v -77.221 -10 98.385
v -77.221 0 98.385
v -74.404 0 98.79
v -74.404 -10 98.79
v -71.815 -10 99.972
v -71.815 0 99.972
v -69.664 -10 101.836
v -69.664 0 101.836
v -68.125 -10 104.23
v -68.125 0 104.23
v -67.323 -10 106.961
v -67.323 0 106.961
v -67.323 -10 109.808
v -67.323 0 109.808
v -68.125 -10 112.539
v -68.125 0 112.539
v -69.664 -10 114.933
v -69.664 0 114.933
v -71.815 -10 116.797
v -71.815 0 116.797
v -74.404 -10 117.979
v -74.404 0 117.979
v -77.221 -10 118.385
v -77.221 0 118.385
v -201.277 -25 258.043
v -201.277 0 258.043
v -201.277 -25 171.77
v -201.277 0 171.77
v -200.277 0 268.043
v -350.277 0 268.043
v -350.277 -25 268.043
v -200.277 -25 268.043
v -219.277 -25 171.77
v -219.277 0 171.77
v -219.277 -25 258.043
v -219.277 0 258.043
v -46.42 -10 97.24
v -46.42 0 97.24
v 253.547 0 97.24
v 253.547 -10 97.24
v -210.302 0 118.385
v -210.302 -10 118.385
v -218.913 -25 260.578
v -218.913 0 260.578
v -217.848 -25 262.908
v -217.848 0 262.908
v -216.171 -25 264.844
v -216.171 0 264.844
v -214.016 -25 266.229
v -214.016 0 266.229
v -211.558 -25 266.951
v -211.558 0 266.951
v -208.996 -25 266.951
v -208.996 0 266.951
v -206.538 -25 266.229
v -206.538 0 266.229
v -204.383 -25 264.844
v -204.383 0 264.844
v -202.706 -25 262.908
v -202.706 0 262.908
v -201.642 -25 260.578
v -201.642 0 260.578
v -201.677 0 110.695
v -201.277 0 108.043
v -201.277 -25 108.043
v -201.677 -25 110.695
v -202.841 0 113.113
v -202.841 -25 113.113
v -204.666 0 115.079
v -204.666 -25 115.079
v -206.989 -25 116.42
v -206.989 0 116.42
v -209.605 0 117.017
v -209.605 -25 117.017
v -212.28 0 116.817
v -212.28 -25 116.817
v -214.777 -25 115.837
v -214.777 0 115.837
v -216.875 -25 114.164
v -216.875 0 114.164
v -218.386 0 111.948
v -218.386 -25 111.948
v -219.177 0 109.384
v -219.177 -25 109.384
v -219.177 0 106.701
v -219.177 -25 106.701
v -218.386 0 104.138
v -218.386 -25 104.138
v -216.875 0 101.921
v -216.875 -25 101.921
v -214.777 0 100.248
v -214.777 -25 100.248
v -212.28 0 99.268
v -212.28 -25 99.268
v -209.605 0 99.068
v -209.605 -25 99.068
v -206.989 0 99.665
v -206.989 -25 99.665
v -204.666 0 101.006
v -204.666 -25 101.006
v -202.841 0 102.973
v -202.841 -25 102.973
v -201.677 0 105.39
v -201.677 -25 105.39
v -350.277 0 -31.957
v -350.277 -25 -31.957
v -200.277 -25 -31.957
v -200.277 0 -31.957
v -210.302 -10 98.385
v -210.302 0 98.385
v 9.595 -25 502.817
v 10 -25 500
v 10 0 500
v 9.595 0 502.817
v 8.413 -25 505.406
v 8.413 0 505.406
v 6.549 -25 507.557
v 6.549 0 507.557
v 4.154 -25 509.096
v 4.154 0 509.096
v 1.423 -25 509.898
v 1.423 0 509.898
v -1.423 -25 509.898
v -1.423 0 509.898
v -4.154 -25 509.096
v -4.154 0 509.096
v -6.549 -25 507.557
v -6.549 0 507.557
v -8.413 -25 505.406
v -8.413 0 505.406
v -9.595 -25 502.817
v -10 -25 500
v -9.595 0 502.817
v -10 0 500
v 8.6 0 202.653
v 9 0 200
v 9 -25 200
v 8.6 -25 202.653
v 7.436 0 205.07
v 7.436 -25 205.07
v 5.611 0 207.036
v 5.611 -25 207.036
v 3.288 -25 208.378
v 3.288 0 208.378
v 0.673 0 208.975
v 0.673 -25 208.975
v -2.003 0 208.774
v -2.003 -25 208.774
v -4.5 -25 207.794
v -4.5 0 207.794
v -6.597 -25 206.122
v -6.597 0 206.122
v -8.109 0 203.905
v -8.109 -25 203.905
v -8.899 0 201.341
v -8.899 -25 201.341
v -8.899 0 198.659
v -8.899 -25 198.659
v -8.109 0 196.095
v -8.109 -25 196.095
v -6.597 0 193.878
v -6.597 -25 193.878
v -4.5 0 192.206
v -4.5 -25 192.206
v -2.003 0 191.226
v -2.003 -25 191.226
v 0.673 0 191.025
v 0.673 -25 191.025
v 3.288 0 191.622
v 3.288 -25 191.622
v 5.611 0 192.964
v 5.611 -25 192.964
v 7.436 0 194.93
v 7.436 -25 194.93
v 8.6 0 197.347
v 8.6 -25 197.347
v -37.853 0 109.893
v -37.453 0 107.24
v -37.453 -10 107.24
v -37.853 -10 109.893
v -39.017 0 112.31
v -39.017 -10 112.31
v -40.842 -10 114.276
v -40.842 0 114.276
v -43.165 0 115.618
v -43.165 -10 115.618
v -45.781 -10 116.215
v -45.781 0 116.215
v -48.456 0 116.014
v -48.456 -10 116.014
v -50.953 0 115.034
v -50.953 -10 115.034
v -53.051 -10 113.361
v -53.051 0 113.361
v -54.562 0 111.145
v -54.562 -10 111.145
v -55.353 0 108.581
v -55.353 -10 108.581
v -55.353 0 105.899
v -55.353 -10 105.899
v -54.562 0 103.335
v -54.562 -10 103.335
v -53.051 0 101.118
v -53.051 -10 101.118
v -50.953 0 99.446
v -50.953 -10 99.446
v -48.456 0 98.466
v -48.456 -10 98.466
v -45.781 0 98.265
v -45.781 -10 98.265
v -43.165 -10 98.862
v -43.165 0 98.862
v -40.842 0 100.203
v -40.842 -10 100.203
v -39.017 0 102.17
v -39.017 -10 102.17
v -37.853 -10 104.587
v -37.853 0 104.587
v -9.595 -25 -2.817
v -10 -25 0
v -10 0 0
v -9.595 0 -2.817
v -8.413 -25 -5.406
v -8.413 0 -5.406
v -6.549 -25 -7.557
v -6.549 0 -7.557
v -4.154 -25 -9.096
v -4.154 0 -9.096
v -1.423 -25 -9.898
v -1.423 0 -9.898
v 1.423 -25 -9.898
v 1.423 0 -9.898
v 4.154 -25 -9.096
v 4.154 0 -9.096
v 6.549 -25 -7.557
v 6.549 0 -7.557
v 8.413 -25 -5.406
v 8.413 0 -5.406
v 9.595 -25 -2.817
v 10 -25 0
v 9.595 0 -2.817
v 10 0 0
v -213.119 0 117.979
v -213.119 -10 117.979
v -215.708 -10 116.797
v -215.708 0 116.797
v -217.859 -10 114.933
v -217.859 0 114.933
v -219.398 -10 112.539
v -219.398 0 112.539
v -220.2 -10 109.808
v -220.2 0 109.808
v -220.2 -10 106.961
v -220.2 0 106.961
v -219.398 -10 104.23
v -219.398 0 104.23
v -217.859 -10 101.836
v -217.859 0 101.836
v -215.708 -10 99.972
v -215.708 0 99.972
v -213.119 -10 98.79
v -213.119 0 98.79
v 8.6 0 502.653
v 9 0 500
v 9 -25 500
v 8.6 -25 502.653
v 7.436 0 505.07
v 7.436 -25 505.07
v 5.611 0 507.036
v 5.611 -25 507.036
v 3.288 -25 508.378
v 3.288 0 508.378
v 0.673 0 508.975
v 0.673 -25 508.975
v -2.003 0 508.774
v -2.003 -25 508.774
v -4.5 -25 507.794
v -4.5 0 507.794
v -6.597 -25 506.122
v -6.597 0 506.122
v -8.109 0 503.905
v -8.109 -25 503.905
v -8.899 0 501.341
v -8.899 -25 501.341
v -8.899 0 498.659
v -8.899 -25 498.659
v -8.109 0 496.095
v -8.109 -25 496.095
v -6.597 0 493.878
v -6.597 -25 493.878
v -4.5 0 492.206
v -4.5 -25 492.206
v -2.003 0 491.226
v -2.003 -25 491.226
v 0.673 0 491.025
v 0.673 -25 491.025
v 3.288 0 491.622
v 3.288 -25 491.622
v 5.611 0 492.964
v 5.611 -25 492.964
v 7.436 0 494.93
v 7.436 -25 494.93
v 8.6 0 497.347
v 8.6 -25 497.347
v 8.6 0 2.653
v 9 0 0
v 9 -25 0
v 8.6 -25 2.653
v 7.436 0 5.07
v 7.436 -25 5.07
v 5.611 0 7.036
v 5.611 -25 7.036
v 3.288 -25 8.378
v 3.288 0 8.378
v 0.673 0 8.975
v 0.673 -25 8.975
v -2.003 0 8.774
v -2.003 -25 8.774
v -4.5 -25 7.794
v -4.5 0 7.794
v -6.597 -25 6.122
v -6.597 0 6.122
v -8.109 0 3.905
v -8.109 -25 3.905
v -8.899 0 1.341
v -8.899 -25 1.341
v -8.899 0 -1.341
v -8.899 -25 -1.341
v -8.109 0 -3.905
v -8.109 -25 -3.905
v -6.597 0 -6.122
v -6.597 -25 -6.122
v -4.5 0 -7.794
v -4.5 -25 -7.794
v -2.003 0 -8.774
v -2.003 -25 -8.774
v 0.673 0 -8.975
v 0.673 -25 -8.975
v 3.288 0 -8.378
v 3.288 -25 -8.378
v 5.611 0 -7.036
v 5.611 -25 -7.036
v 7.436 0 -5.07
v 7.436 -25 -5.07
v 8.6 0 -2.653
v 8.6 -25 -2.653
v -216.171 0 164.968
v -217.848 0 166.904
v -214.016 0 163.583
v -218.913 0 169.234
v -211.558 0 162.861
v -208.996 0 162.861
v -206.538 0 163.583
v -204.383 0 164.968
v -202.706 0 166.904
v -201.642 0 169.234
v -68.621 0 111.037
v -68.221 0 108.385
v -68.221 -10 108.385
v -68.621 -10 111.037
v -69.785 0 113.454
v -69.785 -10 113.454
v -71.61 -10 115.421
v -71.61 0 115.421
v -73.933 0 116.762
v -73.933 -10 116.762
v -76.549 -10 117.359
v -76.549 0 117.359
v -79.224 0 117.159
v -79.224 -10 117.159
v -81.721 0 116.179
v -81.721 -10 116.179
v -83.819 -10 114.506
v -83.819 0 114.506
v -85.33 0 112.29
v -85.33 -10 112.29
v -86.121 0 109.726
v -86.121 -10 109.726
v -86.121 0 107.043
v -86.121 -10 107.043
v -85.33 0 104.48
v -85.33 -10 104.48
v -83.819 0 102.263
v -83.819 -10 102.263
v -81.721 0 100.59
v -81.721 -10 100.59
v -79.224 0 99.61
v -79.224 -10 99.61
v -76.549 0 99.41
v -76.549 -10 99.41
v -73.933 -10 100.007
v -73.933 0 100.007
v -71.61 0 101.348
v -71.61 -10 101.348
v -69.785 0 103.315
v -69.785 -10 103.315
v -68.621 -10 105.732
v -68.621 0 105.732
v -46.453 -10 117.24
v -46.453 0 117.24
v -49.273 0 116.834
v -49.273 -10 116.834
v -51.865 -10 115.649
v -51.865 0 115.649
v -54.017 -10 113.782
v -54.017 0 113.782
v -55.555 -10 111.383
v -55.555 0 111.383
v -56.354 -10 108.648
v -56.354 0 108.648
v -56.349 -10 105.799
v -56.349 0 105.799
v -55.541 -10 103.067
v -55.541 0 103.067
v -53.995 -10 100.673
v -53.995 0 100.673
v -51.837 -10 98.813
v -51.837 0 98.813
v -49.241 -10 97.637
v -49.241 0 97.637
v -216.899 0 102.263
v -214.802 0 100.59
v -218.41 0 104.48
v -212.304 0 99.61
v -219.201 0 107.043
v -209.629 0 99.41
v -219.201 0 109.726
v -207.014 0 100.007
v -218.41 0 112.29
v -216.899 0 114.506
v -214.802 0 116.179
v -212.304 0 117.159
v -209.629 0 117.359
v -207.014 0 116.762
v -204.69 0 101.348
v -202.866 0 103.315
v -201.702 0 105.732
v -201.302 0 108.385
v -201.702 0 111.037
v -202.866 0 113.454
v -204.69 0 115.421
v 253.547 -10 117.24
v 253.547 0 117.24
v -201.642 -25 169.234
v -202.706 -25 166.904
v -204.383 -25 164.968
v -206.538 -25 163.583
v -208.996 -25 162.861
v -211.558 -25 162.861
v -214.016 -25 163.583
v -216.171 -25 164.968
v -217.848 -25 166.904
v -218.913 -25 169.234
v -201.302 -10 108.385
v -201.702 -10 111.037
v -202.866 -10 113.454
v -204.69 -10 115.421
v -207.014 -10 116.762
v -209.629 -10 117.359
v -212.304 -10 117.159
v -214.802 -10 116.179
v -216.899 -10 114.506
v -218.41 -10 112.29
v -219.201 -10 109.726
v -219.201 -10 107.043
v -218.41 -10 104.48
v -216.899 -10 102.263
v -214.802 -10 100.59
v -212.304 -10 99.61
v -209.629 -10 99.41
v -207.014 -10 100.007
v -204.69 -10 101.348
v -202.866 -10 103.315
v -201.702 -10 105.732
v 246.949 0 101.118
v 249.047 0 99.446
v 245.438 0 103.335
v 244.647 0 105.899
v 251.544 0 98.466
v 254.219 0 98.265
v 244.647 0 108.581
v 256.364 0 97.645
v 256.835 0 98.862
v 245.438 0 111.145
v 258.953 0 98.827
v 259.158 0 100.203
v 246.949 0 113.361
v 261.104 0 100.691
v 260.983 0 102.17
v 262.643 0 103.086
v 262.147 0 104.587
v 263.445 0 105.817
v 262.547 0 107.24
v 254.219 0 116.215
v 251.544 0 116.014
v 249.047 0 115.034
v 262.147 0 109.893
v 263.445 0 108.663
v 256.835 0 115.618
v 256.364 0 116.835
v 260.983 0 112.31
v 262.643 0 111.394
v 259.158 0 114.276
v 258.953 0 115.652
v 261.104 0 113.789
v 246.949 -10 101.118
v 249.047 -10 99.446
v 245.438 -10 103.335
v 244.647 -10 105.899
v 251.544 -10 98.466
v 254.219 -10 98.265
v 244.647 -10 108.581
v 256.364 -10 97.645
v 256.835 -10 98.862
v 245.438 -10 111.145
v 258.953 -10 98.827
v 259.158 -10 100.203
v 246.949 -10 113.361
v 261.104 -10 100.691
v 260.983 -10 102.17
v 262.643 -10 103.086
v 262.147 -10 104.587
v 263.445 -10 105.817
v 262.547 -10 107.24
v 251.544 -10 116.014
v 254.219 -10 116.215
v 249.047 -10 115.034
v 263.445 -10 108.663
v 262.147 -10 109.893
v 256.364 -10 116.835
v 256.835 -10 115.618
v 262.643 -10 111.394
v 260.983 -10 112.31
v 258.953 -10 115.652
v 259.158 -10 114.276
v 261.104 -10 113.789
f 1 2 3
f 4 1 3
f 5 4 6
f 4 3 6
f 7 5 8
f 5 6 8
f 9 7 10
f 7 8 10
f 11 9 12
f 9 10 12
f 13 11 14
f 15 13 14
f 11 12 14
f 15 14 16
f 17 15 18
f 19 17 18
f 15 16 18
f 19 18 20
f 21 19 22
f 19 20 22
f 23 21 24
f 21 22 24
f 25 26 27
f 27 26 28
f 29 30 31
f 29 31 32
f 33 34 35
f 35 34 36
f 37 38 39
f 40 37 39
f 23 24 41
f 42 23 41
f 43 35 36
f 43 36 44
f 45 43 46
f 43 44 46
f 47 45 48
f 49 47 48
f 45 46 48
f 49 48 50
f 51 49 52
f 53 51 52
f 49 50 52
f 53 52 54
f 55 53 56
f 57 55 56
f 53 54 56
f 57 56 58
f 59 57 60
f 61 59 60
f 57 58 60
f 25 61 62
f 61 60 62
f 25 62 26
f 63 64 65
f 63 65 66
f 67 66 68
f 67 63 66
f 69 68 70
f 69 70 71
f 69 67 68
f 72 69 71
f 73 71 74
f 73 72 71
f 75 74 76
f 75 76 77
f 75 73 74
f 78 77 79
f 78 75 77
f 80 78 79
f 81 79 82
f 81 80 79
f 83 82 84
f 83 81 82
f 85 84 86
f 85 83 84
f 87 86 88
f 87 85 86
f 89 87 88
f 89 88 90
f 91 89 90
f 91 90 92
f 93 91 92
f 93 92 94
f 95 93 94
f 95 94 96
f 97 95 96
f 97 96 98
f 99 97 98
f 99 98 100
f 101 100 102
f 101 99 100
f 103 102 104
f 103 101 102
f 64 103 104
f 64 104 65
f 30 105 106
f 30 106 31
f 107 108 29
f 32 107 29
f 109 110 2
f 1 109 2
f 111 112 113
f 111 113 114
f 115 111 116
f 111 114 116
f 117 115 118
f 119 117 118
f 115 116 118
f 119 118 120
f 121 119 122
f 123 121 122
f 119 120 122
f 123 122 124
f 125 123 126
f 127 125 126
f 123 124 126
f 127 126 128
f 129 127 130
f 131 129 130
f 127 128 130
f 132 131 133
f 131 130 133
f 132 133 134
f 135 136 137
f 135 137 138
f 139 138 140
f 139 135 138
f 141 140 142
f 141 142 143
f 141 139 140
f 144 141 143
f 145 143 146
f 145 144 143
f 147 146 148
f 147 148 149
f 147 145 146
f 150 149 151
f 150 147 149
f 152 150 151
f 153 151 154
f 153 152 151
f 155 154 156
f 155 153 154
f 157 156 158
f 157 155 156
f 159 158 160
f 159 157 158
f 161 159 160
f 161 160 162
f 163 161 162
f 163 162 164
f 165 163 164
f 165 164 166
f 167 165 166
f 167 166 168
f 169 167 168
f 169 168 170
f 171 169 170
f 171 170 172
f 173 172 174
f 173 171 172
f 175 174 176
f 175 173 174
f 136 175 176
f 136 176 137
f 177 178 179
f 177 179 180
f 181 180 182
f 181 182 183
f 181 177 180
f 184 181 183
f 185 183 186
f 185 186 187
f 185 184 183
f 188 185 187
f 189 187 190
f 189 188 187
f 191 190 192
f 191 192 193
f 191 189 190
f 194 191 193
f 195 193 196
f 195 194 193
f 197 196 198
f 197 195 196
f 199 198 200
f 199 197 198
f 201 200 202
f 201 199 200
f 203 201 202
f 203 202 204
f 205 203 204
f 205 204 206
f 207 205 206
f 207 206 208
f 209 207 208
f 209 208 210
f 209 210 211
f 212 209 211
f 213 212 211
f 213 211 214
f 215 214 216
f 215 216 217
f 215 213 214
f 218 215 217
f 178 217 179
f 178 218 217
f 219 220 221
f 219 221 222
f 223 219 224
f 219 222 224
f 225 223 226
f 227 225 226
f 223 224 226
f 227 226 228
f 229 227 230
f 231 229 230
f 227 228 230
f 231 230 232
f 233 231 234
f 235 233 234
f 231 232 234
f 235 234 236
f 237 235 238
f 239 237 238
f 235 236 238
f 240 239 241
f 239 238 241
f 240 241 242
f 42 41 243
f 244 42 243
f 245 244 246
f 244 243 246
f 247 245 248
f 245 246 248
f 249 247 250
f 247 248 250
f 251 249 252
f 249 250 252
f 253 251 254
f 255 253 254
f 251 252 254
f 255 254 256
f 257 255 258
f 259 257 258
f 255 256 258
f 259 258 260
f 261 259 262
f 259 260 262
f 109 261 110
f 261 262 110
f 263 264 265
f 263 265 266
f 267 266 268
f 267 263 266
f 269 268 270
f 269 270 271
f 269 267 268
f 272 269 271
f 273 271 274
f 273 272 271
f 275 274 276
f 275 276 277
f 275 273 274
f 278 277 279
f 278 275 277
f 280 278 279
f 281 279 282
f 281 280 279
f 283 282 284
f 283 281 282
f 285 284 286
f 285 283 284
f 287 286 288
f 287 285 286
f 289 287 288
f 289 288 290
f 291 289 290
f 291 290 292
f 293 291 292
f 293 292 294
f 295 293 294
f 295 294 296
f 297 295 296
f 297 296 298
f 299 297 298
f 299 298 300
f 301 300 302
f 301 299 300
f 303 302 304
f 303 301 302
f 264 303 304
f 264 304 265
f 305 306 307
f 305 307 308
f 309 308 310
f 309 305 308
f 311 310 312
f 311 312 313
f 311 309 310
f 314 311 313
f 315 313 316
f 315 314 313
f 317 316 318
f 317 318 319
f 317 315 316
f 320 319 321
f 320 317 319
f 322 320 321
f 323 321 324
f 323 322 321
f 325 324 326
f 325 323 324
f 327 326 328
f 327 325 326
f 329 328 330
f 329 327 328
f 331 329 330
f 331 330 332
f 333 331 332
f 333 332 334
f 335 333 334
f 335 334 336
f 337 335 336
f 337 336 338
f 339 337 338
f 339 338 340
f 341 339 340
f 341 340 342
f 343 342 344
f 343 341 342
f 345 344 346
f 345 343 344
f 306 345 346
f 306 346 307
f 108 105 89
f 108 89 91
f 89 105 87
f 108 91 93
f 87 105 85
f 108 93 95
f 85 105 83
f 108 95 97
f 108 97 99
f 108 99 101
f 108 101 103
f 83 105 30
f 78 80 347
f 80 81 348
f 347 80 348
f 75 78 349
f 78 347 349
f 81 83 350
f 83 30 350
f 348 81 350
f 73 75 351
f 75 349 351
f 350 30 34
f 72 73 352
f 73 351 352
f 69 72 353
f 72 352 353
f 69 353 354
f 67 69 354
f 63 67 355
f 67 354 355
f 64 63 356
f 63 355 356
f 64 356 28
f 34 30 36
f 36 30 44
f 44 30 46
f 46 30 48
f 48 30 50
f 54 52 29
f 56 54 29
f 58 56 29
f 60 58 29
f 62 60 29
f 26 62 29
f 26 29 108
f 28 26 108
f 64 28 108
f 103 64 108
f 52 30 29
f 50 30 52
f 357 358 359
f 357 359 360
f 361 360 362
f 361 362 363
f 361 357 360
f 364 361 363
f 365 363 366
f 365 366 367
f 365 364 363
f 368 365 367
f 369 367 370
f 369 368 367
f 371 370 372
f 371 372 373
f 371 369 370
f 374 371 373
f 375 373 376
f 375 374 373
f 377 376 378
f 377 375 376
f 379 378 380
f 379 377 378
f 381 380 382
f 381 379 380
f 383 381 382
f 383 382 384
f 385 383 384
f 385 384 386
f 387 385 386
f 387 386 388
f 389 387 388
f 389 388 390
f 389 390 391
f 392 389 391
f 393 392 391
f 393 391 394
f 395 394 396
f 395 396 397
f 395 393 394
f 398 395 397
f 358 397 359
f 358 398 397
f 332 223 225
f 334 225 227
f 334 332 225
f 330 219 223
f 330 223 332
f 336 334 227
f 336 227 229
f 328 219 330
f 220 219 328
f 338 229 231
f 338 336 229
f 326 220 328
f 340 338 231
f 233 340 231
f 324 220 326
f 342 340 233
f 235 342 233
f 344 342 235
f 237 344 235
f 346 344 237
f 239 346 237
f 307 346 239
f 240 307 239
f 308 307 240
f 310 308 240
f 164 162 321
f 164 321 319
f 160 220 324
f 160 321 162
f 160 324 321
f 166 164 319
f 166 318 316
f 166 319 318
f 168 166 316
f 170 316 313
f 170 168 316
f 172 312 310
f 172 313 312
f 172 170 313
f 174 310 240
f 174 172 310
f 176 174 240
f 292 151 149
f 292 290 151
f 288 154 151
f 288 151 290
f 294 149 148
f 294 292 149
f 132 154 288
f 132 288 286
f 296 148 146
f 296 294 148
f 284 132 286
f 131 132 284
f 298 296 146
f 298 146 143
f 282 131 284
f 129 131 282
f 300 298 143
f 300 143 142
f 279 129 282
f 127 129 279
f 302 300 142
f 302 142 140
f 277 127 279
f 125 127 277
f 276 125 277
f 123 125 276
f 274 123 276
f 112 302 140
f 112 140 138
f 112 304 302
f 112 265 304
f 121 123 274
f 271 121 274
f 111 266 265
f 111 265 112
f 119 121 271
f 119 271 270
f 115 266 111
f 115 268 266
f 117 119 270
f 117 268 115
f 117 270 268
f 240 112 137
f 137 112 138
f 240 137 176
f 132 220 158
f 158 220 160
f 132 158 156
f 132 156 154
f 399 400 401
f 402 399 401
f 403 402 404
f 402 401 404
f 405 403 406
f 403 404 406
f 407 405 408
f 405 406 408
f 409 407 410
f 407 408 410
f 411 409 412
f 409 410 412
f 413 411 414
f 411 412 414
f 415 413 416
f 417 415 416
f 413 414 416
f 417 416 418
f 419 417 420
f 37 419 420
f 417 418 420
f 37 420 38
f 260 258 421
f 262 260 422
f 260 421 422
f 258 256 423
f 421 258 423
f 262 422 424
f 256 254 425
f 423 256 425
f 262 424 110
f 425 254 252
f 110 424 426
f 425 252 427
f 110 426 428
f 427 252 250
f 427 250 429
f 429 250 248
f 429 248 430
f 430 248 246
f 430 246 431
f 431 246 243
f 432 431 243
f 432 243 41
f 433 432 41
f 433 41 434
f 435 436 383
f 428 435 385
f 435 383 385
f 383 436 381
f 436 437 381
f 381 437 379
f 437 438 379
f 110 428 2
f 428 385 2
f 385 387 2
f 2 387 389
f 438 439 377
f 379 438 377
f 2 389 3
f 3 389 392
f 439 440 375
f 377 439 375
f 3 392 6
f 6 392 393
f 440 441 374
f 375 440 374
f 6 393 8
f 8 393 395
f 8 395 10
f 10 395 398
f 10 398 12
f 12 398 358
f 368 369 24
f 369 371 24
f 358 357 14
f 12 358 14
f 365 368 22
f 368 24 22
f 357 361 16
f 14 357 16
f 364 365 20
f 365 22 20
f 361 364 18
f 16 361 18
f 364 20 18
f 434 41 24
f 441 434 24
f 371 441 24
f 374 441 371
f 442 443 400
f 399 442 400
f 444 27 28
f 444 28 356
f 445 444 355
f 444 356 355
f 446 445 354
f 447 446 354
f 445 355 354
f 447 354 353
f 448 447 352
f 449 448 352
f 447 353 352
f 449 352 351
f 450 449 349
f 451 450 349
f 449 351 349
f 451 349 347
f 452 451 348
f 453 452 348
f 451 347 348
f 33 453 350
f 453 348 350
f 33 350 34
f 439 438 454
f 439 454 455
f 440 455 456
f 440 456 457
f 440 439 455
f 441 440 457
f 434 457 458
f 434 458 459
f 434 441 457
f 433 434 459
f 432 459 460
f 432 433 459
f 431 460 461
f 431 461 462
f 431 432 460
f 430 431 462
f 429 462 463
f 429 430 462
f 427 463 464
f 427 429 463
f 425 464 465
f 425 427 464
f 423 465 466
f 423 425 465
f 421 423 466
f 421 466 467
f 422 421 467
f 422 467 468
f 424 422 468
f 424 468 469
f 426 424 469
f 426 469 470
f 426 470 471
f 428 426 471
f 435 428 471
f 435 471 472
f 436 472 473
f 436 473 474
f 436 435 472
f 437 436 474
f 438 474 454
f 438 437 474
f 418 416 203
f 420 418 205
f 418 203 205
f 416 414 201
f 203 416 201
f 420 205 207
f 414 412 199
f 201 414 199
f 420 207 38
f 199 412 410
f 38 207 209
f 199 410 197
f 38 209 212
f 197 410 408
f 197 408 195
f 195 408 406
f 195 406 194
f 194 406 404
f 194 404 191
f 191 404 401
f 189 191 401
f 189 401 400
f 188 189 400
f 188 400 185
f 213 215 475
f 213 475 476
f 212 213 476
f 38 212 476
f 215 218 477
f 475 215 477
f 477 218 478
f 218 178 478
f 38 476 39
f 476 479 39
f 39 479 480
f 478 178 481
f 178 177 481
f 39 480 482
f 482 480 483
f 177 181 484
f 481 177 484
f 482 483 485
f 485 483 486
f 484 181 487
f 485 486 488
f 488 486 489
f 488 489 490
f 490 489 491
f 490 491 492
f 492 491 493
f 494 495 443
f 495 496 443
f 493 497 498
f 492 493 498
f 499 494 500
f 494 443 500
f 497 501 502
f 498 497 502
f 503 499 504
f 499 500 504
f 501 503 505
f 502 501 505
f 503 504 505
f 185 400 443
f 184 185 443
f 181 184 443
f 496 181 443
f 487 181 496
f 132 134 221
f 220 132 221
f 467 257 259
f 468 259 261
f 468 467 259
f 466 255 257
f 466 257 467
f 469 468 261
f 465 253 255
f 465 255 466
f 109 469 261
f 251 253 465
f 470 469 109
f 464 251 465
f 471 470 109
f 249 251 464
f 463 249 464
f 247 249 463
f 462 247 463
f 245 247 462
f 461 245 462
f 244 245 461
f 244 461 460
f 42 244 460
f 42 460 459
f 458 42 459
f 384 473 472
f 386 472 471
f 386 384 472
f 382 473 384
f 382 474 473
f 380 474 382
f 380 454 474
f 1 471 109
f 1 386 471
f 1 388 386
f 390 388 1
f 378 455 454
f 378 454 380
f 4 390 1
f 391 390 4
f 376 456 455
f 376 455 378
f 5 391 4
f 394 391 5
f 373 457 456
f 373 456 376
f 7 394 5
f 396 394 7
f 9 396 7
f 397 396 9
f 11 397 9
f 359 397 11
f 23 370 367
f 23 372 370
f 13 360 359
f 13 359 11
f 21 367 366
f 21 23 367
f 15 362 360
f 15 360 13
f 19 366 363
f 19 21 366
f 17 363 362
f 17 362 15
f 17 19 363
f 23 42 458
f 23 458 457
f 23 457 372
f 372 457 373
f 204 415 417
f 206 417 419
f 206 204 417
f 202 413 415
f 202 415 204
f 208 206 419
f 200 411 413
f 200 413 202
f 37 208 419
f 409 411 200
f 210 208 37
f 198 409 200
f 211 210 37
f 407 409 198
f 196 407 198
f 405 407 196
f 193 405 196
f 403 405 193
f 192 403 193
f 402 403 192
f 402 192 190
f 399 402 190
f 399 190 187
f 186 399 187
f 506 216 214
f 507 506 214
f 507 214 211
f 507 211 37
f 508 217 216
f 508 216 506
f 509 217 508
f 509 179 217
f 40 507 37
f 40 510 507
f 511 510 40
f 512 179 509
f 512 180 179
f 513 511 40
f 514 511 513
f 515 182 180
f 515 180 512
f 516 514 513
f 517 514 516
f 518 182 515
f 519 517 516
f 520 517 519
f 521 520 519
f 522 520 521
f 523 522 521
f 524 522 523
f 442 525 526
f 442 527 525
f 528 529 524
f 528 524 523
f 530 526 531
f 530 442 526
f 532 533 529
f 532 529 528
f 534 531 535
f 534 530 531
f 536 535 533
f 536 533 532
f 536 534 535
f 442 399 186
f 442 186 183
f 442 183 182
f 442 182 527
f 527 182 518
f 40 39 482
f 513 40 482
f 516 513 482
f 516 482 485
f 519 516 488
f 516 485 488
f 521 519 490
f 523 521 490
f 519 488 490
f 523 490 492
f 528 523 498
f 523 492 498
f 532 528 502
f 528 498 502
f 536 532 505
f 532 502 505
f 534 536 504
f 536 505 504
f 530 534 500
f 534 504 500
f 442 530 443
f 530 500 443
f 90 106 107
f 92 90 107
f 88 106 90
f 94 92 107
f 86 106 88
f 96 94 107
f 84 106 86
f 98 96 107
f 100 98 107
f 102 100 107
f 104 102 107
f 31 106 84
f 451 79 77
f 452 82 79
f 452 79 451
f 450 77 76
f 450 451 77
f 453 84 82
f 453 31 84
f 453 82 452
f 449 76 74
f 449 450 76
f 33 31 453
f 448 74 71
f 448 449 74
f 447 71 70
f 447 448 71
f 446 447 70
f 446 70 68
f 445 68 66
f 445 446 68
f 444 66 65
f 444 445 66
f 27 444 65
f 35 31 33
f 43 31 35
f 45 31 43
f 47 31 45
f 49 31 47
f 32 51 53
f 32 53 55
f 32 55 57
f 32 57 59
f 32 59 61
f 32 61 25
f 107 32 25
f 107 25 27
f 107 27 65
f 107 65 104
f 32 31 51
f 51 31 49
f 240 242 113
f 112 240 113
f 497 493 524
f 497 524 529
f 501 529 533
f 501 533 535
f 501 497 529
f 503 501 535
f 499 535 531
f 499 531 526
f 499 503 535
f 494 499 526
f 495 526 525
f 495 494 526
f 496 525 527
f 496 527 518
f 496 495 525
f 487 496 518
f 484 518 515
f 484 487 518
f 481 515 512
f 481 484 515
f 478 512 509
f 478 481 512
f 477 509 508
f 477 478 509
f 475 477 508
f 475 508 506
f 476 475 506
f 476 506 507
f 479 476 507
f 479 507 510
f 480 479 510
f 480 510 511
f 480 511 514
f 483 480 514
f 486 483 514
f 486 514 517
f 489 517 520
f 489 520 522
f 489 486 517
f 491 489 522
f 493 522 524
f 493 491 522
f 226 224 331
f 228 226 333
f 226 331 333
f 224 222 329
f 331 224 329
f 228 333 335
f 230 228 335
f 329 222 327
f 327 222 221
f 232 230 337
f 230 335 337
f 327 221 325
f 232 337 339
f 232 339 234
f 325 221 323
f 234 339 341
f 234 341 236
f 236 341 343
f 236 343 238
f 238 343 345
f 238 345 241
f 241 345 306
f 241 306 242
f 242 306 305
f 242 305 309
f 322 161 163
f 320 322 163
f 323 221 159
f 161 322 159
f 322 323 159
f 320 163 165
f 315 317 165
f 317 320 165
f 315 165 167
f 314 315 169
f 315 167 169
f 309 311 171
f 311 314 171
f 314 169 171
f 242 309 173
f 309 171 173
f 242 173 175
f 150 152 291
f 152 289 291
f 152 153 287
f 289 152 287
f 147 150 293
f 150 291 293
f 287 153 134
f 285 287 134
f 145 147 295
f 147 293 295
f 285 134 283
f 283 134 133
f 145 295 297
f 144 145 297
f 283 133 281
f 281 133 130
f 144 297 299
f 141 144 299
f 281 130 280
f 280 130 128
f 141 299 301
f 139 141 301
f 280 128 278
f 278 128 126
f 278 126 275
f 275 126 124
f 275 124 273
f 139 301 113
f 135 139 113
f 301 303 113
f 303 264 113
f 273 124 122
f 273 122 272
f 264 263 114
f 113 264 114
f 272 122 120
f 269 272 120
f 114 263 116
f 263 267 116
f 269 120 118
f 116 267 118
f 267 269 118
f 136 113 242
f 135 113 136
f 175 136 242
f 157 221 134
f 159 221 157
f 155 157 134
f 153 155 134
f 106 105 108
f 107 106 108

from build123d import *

# Parameters (mm, degrees)
F0_R     = 9
F1_DEPTH = 25
F2_W     = 150
F2_H     = 300
F2_R     = 9
F3_DEPTH = 25
F4_R     = 9
F5_DEPTH = 10
F6_R     = 9
F7_DEPTH = 10


with BuildPart() as f1:
    # F0 (on Front) → F1 (new body)
    with BuildSketch(Plane.XZ):
        with BuildLine():
            Line((10, 0), (10, 500))
            ThreePointArc((10, 500), (0, 510), (-10, 500))
            Line((-10, 500), (-10, 0))
            ThreePointArc((-10, 0), (0, -10), (10, 0))
        make_face()
        Circle(F0_R, mode=Mode.SUBTRACT)
        with Locations((0, 200)):
            Circle(F0_R, mode=Mode.SUBTRACT)
        with Locations((0, 500)):
            Circle(F0_R, mode=Mode.SUBTRACT)
    extrude(amount=F1_DEPTH)


with BuildPart() as f3:
    # F2 (on Front) → F3 (new body)
    with BuildSketch(Plane.XZ):
        with Locations((-275.277209, 118.042635)):
            Rectangle(F2_W, F2_H)
        with Locations((-210.277209, 108.042635)):
            Circle(F2_R, mode=Mode.SUBTRACT)
        with BuildLine():
            ThreePointArc((-219.277209, 258.042635), (-210.277209, 267.042635), (-201.277209, 258.042635))
            Line((-201.277209, 258.042635), (-201.277209, 171.769887))
            ThreePointArc((-201.277209, 171.769887), (-210.277209, 162.769887), (-219.277209, 171.769887))
            Line((-219.277209, 171.769887), (-219.277209, 258.042635))
        make_face(mode=Mode.SUBTRACT)
    extrude(amount=F3_DEPTH)


with BuildPart() as f5:
    # F4 (on Front) → F5 (new body)
    with BuildSketch(Plane.XZ):
        with BuildLine():
            Line((-77.221449, 118.384557), (-210.301742, 118.384557))
            ThreePointArc((-210.301742, 118.384557), (-220.301742, 108.384557), (-210.301742, 98.384557))
            Line((-210.301742, 98.384557), (-77.221449, 98.384557))
            ThreePointArc((-77.221449, 98.384557), (-67.221449, 108.384557), (-77.221449, 118.384557))
        make_face()
        with Locations((-210.301742, 108.384557)):
            Circle(F4_R, mode=Mode.SUBTRACT)
        with Locations((-77.221449, 108.384557)):
            Circle(F4_R, mode=Mode.SUBTRACT)
    extrude(amount=F5_DEPTH)


with BuildPart() as f7:
    # F6 (on Front) → F7 (new body)
    with BuildSketch(Plane.XZ):
        with BuildLine():
            Line((253.546802, 117.239939), (-46.453198, 117.239939))
            ThreePointArc((-46.453198, 117.239939), (-56.453184, 107.223272), (-46.419864, 97.239995))
            Line((-46.419864, 97.239995), (253.5468, 97.239939))
            ThreePointArc((253.5468, 97.239939), (263.546802, 107.239938), (253.546802, 117.239939))
        make_face()
        with Locations((-46.453198, 107.239939)):
            Circle(F6_R, mode=Mode.SUBTRACT)
        with Locations((253.546802, 107.239939)):
            Circle(F6_R, mode=Mode.SUBTRACT)
    extrude(amount=F7_DEPTH)


solid = Compound([f1.part, f3.part, f5.part, f7.part])
